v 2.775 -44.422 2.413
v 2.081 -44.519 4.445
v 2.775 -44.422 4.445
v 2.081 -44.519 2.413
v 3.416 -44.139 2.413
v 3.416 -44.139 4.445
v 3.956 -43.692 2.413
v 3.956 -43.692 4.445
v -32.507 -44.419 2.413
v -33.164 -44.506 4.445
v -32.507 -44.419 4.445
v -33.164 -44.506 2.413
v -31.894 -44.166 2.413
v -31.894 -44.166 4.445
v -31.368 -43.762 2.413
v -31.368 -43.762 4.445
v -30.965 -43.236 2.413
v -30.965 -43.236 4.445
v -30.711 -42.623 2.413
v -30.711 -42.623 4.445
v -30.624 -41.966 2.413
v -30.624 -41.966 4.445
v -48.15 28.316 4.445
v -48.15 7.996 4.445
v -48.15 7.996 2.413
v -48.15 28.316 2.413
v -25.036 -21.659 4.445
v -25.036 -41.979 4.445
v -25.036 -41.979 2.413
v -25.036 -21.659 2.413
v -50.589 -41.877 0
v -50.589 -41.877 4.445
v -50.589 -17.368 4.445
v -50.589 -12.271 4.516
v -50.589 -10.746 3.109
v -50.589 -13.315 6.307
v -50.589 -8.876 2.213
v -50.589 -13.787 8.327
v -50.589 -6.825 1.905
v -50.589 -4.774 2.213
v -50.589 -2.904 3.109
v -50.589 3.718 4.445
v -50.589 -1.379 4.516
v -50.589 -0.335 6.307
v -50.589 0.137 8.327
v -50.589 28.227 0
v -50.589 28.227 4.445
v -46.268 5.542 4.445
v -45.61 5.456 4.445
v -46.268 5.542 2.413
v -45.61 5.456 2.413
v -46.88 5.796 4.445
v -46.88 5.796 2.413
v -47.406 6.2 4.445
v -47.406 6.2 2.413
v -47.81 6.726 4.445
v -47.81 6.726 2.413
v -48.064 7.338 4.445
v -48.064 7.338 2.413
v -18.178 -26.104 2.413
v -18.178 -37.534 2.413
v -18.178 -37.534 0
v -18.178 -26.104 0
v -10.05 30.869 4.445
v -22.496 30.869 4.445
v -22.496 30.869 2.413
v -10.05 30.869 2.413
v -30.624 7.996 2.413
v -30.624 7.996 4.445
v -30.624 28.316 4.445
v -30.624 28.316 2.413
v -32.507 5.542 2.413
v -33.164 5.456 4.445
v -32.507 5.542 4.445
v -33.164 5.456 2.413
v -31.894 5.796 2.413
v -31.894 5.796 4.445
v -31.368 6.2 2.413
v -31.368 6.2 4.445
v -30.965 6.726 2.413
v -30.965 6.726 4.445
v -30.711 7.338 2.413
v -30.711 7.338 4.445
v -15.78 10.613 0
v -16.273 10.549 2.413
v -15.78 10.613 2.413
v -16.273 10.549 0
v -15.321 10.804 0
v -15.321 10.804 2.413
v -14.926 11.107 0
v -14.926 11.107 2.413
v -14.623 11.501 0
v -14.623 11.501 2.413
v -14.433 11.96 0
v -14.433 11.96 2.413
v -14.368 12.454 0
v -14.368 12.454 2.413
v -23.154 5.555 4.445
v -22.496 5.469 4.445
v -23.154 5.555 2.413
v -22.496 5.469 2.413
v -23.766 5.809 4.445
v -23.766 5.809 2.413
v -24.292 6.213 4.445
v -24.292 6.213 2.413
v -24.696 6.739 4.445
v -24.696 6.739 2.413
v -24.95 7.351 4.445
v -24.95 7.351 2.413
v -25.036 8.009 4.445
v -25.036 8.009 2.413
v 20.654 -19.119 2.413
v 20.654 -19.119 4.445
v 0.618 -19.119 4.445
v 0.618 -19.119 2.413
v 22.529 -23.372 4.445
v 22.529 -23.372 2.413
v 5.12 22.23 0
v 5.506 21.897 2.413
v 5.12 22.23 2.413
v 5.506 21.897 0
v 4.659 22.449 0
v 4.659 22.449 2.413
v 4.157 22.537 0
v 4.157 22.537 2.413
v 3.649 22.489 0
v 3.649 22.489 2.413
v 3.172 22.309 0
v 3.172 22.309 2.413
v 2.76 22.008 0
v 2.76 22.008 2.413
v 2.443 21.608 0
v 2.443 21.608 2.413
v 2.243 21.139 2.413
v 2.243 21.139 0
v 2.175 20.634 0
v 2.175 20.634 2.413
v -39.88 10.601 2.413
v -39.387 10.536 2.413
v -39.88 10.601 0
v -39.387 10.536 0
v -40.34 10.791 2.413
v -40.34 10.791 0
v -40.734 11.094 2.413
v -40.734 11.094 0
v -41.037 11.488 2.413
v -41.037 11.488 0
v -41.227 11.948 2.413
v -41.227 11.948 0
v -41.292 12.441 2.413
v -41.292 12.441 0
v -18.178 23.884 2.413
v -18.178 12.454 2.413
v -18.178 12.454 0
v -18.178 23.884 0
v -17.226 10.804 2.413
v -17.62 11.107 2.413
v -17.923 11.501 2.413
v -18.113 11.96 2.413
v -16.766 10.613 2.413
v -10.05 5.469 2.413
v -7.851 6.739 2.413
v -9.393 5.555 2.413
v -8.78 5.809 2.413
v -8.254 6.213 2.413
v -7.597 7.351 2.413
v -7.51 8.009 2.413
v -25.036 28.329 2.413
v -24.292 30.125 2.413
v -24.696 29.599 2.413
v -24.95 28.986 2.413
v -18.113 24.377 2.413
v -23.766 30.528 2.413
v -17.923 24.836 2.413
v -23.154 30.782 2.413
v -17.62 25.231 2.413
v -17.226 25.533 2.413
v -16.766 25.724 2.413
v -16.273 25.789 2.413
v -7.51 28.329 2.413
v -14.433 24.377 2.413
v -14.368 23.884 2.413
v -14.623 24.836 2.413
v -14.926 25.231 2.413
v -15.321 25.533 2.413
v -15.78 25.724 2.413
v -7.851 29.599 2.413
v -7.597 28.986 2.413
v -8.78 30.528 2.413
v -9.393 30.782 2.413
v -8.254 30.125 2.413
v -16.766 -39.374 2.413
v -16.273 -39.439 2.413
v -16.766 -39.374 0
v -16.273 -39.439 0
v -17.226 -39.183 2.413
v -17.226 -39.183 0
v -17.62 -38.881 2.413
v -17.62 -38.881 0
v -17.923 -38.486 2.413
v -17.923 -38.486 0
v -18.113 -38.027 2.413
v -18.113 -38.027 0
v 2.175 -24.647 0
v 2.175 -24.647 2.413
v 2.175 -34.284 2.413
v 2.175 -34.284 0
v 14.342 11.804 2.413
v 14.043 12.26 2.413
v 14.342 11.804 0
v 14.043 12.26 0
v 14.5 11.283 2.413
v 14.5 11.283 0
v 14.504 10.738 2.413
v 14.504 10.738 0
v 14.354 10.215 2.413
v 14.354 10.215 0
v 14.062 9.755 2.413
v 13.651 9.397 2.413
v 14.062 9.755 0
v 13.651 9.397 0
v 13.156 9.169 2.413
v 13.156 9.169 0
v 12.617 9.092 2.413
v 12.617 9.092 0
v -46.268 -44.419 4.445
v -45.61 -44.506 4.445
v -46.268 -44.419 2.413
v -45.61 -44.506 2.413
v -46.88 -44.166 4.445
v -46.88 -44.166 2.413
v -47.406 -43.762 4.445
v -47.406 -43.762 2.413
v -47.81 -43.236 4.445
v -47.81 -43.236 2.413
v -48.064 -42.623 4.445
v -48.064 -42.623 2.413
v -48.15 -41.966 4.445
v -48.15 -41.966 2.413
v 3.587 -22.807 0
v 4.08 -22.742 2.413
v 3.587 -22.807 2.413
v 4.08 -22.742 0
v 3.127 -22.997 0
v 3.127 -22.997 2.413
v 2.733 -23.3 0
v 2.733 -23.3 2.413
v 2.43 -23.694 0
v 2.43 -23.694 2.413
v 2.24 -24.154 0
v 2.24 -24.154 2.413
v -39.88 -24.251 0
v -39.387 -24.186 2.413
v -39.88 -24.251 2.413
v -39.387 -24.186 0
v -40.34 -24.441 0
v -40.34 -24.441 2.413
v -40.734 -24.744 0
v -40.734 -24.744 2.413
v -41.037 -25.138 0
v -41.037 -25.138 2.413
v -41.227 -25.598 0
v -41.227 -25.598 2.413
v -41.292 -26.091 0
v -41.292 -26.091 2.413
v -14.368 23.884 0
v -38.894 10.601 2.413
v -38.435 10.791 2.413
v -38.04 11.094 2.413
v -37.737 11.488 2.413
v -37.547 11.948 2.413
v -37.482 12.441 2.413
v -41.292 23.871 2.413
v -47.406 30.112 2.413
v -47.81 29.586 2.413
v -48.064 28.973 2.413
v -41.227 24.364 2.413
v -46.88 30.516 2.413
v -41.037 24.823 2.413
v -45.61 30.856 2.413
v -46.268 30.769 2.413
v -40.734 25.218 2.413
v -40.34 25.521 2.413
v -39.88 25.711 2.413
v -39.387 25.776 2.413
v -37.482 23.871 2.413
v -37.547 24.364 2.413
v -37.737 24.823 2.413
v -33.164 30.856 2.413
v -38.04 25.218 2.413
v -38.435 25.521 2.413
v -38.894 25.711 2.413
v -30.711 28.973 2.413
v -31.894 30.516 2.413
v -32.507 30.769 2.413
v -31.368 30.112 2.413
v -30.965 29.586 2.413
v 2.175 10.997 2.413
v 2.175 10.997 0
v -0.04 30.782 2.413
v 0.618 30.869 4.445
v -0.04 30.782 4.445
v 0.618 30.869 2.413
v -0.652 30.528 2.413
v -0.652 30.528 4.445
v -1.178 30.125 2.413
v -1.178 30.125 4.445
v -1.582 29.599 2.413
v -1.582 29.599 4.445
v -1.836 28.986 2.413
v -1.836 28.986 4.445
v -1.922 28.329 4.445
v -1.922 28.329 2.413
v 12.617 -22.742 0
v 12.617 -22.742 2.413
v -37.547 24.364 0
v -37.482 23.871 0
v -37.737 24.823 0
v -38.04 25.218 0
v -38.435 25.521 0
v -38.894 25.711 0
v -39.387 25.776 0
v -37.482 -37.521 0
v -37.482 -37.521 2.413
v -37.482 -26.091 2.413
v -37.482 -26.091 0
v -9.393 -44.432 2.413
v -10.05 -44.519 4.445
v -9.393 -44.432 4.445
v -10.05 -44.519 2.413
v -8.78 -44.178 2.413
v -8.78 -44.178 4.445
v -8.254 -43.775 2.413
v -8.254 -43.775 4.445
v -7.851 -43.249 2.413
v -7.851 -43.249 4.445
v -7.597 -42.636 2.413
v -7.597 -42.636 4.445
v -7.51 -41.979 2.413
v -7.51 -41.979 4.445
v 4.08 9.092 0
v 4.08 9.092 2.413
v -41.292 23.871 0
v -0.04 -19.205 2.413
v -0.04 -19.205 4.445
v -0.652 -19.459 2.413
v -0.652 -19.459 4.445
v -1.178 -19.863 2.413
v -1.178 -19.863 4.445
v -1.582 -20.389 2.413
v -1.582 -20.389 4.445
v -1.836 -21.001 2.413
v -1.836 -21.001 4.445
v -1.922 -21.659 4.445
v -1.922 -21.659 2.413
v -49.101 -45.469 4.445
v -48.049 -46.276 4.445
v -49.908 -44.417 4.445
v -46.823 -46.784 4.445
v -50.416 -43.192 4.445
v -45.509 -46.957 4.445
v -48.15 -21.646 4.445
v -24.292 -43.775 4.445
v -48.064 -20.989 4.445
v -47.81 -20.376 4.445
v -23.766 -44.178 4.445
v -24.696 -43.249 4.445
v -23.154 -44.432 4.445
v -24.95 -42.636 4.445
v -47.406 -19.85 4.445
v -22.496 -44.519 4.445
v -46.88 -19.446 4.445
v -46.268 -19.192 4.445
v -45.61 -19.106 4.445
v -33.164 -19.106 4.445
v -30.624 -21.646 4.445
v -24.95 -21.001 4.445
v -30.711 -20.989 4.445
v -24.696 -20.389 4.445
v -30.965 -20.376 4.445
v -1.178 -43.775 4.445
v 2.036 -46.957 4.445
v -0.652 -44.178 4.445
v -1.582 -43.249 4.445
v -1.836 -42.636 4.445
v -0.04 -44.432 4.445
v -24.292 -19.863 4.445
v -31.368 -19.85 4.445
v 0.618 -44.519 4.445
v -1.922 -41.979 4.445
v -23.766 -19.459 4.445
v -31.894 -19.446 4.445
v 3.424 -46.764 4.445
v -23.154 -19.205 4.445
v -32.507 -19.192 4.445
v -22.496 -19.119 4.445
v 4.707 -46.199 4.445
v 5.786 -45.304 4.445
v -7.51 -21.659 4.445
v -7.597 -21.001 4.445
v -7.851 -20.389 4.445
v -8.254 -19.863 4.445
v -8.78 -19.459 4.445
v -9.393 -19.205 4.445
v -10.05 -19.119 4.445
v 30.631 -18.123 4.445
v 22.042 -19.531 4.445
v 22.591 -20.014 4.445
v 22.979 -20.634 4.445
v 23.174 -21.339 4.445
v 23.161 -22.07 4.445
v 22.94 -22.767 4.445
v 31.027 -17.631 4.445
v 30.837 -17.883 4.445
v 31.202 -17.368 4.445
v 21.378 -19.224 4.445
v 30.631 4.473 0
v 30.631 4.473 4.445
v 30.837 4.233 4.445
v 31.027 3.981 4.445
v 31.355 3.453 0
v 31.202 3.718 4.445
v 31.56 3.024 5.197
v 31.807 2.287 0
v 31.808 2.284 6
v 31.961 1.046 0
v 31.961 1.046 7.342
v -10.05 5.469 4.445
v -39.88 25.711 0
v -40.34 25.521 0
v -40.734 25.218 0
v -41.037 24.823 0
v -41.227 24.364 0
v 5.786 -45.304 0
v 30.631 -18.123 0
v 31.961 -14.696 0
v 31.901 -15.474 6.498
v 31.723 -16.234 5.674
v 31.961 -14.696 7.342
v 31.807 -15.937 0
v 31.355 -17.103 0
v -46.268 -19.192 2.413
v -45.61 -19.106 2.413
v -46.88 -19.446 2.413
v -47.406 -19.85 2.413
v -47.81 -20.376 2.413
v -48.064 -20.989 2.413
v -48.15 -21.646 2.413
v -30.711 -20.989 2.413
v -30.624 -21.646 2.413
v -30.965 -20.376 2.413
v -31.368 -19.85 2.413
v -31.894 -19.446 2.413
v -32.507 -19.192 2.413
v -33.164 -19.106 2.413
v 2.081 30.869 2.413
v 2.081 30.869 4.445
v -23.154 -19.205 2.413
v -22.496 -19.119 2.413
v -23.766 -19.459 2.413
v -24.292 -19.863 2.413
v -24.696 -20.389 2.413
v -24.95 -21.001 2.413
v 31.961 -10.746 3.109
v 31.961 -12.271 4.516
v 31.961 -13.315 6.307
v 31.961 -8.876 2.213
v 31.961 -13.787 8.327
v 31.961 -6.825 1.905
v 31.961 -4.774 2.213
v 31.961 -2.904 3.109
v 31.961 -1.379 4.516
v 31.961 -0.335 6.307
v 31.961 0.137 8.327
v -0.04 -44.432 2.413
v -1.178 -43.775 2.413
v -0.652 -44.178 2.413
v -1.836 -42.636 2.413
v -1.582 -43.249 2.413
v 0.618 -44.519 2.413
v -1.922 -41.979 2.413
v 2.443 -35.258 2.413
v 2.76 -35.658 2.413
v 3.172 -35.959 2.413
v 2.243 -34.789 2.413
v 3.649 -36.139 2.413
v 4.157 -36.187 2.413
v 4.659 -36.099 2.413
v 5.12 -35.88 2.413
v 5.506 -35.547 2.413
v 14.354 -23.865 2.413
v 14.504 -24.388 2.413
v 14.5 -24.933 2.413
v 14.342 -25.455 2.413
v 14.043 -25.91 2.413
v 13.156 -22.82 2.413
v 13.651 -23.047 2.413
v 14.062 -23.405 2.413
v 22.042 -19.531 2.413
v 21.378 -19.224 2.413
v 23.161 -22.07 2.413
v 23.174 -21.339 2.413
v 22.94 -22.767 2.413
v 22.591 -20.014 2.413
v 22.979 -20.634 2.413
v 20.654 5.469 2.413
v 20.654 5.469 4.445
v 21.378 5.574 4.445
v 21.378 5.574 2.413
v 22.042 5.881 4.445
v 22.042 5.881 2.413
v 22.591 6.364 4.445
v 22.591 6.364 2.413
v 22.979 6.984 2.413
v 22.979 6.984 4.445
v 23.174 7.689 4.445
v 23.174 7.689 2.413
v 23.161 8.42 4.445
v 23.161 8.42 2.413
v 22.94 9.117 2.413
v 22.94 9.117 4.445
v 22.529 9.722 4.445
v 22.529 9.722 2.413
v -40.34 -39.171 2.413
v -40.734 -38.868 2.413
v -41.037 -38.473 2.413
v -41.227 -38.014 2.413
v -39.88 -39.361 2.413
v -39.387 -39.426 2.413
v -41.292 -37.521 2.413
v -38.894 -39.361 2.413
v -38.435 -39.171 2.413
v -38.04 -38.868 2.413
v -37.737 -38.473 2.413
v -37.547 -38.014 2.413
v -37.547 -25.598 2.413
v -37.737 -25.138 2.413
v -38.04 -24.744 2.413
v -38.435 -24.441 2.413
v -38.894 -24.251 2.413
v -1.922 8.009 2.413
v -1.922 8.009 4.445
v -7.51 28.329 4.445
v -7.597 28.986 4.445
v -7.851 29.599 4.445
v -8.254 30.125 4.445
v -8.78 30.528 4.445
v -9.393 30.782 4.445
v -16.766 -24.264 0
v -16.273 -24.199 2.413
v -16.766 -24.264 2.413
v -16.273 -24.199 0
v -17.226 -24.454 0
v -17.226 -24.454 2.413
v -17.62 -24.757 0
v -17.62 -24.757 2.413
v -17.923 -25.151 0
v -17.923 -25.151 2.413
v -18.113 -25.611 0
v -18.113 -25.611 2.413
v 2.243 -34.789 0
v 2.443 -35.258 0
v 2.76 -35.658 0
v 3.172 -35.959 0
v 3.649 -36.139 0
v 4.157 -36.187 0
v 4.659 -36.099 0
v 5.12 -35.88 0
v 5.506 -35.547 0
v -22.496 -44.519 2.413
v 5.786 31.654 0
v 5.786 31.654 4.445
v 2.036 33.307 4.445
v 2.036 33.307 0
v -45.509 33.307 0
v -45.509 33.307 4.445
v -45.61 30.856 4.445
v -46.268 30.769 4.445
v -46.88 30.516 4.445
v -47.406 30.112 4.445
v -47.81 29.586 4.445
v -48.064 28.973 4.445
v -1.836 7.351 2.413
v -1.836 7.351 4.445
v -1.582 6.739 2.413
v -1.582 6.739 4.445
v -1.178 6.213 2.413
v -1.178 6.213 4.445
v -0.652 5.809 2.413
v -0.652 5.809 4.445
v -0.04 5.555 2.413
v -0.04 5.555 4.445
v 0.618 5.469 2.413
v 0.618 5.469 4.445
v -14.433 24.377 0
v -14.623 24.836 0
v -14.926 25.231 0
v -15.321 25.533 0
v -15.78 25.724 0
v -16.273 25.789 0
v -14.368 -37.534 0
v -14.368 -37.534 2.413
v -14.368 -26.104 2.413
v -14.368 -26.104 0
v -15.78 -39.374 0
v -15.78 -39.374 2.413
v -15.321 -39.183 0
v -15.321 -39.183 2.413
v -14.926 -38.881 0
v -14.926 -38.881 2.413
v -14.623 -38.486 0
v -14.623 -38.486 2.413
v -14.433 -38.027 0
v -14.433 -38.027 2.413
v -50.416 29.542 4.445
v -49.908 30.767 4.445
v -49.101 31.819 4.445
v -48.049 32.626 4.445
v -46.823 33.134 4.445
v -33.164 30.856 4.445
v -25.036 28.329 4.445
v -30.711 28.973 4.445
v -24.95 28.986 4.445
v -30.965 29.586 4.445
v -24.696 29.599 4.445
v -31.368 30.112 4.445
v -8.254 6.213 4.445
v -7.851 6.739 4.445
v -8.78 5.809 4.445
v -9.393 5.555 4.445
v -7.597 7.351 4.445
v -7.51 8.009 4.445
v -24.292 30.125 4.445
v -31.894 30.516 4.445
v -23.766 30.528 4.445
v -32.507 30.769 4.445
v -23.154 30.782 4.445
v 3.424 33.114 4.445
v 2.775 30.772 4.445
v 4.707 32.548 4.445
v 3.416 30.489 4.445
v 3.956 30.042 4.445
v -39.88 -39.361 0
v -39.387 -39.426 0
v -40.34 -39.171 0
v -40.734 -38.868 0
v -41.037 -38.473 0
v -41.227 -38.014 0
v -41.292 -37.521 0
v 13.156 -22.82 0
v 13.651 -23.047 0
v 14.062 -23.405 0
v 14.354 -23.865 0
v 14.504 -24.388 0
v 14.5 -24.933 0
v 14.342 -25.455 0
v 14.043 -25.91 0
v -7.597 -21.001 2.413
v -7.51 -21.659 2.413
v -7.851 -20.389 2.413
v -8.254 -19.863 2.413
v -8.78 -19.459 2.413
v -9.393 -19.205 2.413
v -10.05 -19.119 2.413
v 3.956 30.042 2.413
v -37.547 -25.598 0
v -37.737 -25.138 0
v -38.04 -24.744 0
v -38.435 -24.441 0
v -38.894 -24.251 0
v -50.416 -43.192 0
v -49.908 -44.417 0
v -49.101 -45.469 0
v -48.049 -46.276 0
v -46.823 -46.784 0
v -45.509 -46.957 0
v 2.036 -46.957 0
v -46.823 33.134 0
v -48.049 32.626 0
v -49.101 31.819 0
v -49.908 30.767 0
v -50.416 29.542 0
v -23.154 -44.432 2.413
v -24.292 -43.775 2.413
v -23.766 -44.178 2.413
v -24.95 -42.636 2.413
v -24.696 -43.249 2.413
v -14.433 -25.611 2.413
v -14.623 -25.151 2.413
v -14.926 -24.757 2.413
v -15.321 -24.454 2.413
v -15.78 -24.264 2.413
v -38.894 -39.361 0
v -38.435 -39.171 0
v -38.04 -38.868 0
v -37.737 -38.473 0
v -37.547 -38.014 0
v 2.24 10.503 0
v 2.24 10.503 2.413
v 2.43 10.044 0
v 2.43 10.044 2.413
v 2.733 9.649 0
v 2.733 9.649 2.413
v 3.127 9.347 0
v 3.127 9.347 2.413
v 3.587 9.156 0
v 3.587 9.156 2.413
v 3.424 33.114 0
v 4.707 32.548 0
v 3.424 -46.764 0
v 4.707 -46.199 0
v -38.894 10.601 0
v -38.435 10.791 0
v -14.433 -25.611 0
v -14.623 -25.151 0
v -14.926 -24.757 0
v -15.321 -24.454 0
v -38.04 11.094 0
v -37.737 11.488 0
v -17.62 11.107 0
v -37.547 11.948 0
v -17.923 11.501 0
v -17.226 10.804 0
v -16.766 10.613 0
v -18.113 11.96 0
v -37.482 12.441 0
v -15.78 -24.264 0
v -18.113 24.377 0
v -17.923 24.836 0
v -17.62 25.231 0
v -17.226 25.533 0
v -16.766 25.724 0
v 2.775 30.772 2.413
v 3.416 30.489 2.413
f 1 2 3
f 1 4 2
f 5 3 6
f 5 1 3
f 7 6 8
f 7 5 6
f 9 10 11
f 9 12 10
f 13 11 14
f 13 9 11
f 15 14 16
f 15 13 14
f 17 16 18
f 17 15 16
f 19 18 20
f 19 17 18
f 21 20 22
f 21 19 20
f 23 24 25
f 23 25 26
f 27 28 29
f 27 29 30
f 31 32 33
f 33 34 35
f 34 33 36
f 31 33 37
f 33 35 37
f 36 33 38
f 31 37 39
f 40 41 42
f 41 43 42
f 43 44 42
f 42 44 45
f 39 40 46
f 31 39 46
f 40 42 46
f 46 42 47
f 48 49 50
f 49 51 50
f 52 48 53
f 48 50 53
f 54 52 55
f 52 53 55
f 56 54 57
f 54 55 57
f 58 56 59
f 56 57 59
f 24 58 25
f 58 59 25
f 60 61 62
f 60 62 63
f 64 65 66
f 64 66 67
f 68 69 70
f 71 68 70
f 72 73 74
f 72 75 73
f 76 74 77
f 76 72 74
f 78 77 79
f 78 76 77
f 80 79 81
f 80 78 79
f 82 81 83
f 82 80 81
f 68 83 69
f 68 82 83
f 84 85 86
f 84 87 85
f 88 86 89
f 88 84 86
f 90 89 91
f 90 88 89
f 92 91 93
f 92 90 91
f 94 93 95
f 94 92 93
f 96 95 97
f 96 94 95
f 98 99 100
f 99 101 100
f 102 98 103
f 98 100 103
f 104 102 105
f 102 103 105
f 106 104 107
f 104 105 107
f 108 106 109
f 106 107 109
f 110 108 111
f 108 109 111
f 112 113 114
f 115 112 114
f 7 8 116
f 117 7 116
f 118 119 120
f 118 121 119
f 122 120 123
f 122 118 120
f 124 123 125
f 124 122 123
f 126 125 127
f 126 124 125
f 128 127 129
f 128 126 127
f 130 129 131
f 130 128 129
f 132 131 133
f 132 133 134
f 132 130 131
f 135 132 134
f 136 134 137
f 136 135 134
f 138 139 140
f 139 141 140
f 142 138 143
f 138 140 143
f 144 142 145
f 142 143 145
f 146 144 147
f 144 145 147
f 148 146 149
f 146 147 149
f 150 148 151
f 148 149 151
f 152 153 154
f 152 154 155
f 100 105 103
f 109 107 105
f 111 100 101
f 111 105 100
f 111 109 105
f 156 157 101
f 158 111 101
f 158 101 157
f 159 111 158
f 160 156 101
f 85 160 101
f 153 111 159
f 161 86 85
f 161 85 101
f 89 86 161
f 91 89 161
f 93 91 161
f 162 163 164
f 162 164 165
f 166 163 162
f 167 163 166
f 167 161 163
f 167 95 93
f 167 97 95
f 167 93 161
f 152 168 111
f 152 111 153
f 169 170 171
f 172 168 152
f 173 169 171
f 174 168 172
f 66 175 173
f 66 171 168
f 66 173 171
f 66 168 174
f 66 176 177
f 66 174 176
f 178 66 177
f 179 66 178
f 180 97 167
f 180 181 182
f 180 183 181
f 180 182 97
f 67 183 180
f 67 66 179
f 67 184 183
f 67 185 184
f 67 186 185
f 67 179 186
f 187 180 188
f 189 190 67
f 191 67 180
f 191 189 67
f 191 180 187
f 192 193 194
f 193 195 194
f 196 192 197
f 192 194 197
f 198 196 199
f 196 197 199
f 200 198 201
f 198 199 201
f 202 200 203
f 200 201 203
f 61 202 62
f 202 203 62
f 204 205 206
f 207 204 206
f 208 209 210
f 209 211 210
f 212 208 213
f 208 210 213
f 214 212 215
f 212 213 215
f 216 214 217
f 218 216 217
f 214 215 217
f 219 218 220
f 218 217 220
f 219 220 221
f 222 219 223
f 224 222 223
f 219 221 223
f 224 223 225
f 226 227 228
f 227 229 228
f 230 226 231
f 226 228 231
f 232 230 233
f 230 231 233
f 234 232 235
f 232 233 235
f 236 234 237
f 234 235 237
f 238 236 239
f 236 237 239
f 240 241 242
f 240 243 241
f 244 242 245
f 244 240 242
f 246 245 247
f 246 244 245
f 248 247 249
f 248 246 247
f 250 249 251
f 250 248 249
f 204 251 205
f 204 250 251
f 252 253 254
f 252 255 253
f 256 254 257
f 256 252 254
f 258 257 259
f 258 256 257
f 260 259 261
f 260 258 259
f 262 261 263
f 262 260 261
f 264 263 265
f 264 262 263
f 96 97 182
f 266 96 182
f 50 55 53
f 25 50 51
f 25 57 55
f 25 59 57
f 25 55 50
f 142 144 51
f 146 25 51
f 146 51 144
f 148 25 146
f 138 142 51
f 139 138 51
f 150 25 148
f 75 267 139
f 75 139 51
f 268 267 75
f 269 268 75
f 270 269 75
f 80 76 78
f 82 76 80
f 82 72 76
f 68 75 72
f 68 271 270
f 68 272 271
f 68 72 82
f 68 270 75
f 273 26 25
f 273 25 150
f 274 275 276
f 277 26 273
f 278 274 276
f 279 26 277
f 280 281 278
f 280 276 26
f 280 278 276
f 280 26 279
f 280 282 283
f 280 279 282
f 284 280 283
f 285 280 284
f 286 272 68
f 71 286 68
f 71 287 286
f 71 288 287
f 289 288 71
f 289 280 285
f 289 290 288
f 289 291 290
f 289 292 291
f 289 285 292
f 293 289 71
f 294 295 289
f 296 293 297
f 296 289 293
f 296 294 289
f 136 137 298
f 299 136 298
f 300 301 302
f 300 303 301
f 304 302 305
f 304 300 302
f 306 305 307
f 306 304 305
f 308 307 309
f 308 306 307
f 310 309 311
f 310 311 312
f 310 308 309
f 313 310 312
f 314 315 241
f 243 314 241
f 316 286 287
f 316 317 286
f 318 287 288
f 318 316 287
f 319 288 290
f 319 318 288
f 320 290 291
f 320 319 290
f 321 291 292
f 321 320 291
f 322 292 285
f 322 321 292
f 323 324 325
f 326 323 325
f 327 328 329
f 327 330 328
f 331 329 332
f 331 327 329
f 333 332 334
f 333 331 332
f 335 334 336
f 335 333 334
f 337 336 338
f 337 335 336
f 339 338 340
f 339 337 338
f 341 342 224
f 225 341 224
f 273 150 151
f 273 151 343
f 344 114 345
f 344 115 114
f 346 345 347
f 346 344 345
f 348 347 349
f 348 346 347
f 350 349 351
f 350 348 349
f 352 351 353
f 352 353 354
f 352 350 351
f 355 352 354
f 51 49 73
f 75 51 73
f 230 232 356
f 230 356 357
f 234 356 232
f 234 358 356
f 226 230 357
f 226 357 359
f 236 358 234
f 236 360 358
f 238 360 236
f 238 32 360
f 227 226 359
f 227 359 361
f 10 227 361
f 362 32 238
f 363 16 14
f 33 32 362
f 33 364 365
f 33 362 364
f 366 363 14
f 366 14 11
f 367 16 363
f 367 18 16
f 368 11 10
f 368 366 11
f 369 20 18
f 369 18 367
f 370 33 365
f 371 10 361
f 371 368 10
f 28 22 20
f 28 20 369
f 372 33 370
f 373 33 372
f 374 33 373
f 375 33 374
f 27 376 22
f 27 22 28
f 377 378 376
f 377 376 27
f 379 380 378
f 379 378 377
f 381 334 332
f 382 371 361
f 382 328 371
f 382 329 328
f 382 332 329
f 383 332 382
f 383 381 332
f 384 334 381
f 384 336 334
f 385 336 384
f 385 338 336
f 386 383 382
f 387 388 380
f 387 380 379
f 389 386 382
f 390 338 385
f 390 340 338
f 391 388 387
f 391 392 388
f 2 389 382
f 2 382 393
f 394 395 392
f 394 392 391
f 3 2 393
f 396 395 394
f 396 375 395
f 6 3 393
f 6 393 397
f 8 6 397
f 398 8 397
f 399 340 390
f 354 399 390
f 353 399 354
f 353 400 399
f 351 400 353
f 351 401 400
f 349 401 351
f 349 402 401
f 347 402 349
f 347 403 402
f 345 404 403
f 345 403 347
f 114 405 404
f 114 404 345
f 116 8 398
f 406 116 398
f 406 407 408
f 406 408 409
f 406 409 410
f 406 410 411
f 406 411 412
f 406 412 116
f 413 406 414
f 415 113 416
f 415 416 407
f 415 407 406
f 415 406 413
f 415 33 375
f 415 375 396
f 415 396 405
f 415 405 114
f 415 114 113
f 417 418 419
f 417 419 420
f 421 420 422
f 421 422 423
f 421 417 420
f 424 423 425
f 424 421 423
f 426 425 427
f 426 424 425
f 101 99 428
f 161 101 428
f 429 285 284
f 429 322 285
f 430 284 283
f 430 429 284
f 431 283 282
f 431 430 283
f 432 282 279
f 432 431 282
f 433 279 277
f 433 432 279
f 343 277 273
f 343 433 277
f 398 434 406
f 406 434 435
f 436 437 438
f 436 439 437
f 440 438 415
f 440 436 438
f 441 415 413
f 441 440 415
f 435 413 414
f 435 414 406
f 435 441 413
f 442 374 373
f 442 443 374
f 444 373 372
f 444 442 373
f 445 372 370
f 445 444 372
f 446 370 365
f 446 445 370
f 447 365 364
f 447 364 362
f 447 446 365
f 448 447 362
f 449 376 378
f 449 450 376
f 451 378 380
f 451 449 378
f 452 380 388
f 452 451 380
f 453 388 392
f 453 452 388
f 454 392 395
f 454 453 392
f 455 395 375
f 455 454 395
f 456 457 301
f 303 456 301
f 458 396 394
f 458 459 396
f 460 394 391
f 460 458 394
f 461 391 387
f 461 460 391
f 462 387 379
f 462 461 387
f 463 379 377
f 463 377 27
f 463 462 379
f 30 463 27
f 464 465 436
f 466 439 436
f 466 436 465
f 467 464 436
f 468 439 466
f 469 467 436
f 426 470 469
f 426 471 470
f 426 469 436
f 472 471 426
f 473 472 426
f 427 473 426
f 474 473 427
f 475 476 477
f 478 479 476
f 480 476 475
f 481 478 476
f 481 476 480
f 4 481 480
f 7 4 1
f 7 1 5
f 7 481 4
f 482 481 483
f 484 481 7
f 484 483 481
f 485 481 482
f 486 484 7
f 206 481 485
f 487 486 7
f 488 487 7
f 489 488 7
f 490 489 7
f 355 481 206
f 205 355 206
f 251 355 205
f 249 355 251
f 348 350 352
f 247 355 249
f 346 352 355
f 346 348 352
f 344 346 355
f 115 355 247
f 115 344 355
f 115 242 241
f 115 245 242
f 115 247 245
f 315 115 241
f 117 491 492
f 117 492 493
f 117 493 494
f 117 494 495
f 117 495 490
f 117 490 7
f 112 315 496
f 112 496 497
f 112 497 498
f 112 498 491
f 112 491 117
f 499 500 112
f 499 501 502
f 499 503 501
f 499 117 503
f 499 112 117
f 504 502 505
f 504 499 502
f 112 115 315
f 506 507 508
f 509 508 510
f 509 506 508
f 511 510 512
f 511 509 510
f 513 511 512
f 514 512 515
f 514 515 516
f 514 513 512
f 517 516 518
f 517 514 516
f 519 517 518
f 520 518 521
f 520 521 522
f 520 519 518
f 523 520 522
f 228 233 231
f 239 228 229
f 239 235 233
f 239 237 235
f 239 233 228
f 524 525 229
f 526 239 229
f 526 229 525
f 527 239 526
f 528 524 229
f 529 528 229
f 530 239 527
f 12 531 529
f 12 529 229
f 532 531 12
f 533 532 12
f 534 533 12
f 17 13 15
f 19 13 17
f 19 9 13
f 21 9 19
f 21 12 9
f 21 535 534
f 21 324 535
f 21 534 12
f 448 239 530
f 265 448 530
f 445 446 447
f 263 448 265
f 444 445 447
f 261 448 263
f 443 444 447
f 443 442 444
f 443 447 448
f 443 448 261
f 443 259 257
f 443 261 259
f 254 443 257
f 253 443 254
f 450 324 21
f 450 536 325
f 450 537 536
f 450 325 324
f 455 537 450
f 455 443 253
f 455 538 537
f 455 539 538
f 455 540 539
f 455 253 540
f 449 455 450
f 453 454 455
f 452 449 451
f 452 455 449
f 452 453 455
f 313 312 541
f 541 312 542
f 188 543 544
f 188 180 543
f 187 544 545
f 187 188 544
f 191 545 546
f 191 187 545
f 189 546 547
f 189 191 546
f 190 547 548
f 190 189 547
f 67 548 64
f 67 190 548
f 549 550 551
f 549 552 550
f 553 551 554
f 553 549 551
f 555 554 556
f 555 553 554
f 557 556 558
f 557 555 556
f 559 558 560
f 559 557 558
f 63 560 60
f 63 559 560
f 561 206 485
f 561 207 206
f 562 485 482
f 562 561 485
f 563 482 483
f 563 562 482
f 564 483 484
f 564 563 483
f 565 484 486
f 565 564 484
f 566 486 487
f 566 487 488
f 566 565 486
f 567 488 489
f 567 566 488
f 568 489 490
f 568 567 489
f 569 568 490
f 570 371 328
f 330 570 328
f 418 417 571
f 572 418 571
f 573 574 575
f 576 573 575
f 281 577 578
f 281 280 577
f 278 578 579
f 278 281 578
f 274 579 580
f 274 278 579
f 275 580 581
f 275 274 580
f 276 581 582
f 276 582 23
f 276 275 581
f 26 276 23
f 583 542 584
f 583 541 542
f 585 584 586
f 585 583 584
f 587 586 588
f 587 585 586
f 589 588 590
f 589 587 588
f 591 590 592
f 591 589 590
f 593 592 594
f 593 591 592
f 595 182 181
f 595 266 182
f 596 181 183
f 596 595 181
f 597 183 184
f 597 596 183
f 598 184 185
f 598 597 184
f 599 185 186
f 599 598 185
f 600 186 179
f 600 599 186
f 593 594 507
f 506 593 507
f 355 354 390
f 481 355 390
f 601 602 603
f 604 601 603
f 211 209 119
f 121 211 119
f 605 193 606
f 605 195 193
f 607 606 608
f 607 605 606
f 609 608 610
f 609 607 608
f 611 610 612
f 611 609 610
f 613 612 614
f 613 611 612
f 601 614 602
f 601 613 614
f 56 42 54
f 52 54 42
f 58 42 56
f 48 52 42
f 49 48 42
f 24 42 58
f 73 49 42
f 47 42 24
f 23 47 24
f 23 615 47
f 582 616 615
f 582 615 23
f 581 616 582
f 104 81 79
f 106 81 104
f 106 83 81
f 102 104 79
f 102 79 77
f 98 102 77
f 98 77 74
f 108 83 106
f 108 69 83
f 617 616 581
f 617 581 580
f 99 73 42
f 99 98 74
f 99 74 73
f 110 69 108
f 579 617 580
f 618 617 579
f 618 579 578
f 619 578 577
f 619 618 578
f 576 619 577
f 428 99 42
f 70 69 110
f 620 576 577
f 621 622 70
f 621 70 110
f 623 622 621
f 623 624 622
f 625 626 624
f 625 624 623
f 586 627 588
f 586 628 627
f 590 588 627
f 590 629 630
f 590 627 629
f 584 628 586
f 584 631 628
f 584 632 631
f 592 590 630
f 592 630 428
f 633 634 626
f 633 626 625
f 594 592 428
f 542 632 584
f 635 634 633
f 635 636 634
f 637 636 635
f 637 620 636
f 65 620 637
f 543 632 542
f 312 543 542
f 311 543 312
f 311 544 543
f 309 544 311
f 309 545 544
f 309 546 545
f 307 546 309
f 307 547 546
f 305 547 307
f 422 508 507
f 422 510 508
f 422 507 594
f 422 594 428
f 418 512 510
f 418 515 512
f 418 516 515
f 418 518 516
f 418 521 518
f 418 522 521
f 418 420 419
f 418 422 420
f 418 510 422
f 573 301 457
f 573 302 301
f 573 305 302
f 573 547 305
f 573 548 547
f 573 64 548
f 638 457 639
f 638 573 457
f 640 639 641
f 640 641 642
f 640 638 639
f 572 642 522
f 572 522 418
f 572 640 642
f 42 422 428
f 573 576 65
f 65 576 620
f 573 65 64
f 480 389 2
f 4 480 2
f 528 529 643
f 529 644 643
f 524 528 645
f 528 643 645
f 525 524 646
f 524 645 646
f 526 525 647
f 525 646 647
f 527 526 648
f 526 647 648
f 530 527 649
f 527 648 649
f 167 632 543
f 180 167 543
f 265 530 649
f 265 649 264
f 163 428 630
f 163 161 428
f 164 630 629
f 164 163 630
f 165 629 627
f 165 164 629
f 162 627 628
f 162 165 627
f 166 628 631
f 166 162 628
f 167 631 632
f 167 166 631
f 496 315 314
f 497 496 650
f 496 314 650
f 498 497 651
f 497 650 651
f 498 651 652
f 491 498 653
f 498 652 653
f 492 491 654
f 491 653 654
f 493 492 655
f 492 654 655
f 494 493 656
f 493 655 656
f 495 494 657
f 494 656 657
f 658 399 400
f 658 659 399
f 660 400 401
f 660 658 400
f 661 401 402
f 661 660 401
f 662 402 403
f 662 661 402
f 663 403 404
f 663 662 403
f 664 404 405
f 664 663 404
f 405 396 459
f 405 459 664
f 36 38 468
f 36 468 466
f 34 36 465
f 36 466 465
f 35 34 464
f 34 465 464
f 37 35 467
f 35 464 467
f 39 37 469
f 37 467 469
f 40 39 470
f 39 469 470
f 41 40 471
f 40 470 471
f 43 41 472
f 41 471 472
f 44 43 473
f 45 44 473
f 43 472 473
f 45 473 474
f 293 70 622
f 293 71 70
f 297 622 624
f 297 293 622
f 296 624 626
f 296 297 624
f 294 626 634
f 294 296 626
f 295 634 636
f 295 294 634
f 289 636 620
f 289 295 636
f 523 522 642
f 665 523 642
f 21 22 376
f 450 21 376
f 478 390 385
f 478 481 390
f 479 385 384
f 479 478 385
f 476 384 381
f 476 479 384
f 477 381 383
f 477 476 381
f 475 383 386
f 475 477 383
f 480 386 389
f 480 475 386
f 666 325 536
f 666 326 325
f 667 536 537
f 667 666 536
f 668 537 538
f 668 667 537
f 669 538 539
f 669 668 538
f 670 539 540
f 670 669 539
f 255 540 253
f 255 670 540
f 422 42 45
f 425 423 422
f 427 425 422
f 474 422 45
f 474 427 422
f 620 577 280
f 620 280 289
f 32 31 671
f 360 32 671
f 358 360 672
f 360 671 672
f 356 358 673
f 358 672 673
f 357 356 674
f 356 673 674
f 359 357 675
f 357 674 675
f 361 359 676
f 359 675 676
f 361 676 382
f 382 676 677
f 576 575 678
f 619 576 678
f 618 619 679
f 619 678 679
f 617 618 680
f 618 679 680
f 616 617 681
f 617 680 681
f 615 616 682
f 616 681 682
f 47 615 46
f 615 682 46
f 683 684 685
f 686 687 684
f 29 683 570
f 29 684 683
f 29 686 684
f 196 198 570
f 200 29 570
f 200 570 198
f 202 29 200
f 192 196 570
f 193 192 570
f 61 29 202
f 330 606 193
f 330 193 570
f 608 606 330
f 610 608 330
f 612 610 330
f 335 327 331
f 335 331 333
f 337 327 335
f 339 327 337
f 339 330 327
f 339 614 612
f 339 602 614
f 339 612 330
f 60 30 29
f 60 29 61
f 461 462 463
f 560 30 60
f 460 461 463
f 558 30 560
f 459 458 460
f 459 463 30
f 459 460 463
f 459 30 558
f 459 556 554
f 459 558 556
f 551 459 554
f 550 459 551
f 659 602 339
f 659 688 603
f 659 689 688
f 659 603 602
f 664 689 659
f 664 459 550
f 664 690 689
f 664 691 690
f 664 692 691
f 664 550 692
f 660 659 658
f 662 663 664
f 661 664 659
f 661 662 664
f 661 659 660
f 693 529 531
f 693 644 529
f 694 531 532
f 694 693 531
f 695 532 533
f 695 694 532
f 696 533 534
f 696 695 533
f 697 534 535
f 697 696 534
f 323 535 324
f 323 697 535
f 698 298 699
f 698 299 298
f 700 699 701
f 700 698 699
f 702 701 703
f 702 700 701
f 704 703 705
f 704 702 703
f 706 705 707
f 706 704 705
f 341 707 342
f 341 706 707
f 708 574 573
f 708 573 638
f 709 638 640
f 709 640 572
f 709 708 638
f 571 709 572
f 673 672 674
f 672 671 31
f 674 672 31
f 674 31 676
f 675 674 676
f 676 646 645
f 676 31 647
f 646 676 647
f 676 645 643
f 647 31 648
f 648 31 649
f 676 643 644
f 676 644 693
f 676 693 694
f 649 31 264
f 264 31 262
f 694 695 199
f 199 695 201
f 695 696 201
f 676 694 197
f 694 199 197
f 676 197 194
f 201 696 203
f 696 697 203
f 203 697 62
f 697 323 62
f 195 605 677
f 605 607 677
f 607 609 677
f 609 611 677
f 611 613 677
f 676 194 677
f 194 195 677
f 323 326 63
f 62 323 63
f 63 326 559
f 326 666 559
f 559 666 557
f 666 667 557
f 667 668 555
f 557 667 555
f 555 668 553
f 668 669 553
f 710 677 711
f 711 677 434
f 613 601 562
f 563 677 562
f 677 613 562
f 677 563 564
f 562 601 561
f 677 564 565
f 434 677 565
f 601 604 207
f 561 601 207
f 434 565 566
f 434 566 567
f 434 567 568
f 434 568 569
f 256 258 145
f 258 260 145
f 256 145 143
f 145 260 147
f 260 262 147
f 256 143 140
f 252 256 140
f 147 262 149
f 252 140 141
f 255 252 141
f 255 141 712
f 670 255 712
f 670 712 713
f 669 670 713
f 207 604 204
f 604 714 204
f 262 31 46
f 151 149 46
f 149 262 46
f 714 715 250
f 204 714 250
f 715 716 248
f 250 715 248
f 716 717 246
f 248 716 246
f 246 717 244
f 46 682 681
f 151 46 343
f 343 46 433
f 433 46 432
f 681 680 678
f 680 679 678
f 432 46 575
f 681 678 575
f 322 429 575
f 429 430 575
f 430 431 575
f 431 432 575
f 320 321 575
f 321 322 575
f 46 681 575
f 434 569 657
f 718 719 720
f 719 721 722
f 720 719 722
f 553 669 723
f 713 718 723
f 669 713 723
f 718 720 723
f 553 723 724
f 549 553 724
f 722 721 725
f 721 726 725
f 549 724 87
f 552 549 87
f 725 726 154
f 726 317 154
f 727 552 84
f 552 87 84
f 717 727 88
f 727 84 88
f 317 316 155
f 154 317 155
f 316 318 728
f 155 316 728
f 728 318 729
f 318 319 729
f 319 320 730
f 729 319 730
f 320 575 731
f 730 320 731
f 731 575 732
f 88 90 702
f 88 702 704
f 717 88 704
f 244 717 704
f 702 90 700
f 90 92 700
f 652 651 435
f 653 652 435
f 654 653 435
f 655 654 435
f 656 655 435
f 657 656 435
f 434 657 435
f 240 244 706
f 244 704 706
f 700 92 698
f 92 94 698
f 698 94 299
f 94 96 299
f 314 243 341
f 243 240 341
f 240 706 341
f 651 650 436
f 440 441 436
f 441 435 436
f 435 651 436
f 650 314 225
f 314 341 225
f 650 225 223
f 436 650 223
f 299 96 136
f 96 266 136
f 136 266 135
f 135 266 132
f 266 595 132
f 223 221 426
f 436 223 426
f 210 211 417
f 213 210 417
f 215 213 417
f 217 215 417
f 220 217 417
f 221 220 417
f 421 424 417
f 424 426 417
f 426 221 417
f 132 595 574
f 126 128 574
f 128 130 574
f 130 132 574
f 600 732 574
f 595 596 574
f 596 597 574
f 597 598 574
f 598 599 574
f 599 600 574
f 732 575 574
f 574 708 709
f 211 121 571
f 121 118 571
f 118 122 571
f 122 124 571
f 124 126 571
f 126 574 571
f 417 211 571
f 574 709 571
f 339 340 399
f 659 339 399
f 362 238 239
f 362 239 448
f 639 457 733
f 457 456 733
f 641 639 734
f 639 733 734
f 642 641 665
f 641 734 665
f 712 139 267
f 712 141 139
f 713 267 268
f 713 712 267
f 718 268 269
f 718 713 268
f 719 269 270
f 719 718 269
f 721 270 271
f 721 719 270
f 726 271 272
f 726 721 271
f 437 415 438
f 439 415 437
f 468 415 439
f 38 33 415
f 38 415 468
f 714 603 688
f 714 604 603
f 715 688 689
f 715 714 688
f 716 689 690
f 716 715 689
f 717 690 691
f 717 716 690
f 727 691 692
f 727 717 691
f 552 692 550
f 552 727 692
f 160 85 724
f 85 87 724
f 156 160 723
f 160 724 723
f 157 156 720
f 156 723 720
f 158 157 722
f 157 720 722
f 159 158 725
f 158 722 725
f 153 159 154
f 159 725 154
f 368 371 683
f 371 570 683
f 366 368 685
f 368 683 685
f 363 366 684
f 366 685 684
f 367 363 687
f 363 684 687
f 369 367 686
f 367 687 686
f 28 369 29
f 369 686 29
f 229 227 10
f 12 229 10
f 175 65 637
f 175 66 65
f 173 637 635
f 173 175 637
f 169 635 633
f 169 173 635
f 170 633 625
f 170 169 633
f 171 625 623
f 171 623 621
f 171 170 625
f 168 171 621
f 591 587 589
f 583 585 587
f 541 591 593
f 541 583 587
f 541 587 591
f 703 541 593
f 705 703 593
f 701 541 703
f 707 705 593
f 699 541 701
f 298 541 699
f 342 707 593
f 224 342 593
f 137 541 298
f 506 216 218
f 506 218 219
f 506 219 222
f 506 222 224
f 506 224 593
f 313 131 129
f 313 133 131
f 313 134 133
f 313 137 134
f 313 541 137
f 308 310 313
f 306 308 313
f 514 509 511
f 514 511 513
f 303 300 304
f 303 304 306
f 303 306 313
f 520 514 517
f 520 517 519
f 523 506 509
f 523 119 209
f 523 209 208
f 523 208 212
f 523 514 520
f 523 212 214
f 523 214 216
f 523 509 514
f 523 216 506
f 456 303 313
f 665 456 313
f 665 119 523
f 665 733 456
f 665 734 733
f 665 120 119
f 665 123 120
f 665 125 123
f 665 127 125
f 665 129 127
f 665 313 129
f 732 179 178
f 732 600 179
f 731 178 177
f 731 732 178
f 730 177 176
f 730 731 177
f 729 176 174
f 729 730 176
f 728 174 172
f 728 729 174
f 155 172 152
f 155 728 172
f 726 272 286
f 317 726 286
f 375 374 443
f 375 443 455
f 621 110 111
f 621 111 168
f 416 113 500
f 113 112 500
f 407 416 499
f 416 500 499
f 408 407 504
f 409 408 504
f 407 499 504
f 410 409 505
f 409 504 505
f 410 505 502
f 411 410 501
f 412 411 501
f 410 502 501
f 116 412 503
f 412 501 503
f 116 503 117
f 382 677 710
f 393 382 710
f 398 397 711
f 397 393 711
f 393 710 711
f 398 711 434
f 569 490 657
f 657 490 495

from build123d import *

# Parameters (mm, degrees)
F0_W         = 27.686
F0_H         = 19.685
F1_DEPTH     = 4.445
F4_DEPTH     = 82.55
F5_T4_DEPTH  = 82.55
F5_T9_DEPTH  = 82.55
F3_R         = 6.985
F6_DEPTH     = 101.6
F7_W         = 17.526
F7_H         = 25.4
F8_DEPTH     = 2.032
F9_R         = 2.54
F10_W        = 3.81
F10_H        = 15.24
F11_DEPTH    = 25.4
F12_R        = 1.90499
F13_T1_DEPTH = 29.845
F13_T3_DEPTH = 15.6401229428
F13_T5_DEPTH = 15.0634324568


# Not quite as in the source:
# - a fillet or chamfer that OpenCascade refuses, or shapes differently, is made with other operations: its cross-section is extruded or revolved along the edge and cut away or added
# - a fillet or chamfer is up to 0.001 mm smaller than in the source, because OpenCascade refuses the exact size


with BuildPart() as f1:
    # F0 (on Top) → F1 (new body)
    with BuildSketch(Plane.XY):
        Polygon((4.2753211141, 33.3069552488), (-50.5886788859, 33.3069552488), (-50.5886788859, -46.9570447512), (4.2753211141, -46.9570447512), (4.2753211141, -16.6675447512), (4.2753211141, 3.0174552488), align=None)
        Polygon((31.9613211141, 3.0174552488), (4.2753211141, 33.3069552488), (4.2753211141, 3.0174552488), align=None)
        with Locations((18.1183211141, -6.8250447512)):
            Rectangle(F0_W, F0_H)
        Polygon((4.2753211141, -16.6675447512), (4.2753211141, -46.9570447512), (31.9613211141, -16.6675447512), align=None)
    extrude(amount=F1_DEPTH)

    # F3 (on face) → F4 (join)
    with BuildSketch(Plane.YZ.offset(31.9613211141)):
        with BuildLine():
            Line((-1.4368910785, 4.445), (-12.2131984238, 4.445))
            ThreePointArc((-12.2131984238, 4.445), (-6.8250447512, 1.905), (-1.4368910785, 4.445))
        make_face()
        with BuildLine():
            ThreePointArc((-1.4368910785, 4.445), (-0.2513669981, 6.5284357306), (0.1599552488, 8.89))
            ThreePointArc((0.1599552488, 8.89), (-9.1866090205, 15.4636777531), (-12.2131984238, 4.445))
            Line((-12.2131984238, 4.445), (-1.4368910785, 4.445))
        make_face()
    extrude(amount=-F4_DEPTH)

    # F5: chamfer of 7.62 on 2 edges, made by hand


with BuildPart() as f5_tool2:
    # F5_s3 → F5_t4 (new body)
    with BuildSketch(Plane.YZ.offset(31.9613211141)):
        with BuildLine():
            Line((3.9242683255, 4.2209526948), (-0.0694446449, 8.550803314))
            Line((-0.0694446449, 8.550803314), (-0.2213483693, 8.5630922738))
            ThreePointArc((-0.2213483693, 8.5630922738), (-0.4679887951, 6.3855514916), (-1.554450795, 4.5419818182))
            Line((-1.554450795, 4.5419818182), (-1.4368910785, 4.2926))
            ThreePointArc((-1.4368910785, 4.2926), (1.2436886235, 4.2926), (3.9242683255, 4.0685526948))
            Line((3.9242683255, 4.0685526948), (3.9242683255, 4.2209526948))
        make_face()
    extrude(amount=-F5_T4_DEPTH)

    split(bisect_by=Plane(origin=(18.9157105891, 17.2898319012, 0), x_dir=(0, 0, 1), z_dir=(-0.7381168756, -0.6746728674, 0)), keep=Keep.TOP)


with BuildPart() as f1_1:
    add(f1.part)

    # F5_t1: union F5_tool2
    add(f5_tool2.part)


with BuildPart() as f5_tool7:
    # F5_s8 → F5_t9 (new body)
    with BuildSketch(Plane.YZ.offset(-50.5886788859)):
        with BuildLine():
            Line((-17.5743578278, 4.2209526948), (-13.5806448574, 8.550803314))
            Line((-13.5806448574, 8.550803314), (-13.4287411331, 8.5630922738))
            ThreePointArc((-13.4287411331, 8.5630922738), (-13.1821007073, 6.3855514916), (-12.0956387073, 4.5419818182))
            Line((-12.0956387073, 4.5419818182), (-12.2131984238, 4.2926))
            ThreePointArc((-12.2131984238, 4.2926), (-14.8937781258, 4.2926), (-17.5743578278, 4.0685526948))
            Line((-17.5743578278, 4.0685526948), (-17.5743578278, 4.2209526948))
        make_face()
    extrude(amount=F5_T9_DEPTH)

    split(bisect_by=Plane(origin=(25.7132835648, -23.5031271159, 0), x_dir=(0, 0, 1), z_dir=(-0.7381168756, 0.6746728674, 0)), keep=Keep.TOP)


with BuildPart() as f1_2:
    add(f1_1.part)

    # F5_t6: union F5_tool7
    add(f5_tool7.part)

    # F3 (on face) → F6 (cut)
    with BuildSketch(Plane.YZ.offset(31.9613211141)):
        with Locations((-6.8250447512, 8.89)):
            Circle(F3_R)
    extrude(amount=-F6_DEPTH, mode=Mode.SUBTRACT)

    # F7 (on face) → F8 (cut)
    with BuildSketch(Plane.XY.offset(4.445)):
        with Locations((-39.3872788859, -31.8059447512)):
            Rectangle(F7_W, F7_H)
        with Locations((-16.2732788859, -31.8186447512)):
            Rectangle(F7_W, F7_H)
        Polygon((26.4173608001, -19.1186447512), (-1.9222788859, -19.1186447512), (-1.9222788859, -44.5186447512), (3.2005893116, -44.5186447512), align=None)
        Polygon((3.2005893116, 30.8685552488), (-1.9222788859, 30.8685552488), (-1.9222788859, 5.4685552488), (26.4173608001, 5.4685552488), align=None)
        with Locations((-39.3872788859, 18.1558552488)):
            Rectangle(F7_W, F7_H)
        with Locations((-16.2732788859, 18.1685552488)):
            Rectangle(F7_W, F7_H)
    extrude(amount=-F8_DEPTH, mode=Mode.SUBTRACT)

    # F9
    f9_edges = [f1_2.edges().sort_by_distance(p)[0] for p in [
        (-48.150279, -19.105945, 3.429),
        (-48.150279, 30.855855, 3.429),
        (-25.036279, 30.868555, 3.429),
        (-1.922279, 30.868555, 3.429),
        (3.200589, 30.868555, 3.429),
        (-1.922279, -19.118645, 3.429),
        (-25.036279, -19.118645, 3.429),
        (-30.624279, 30.855855, 3.429),
        (-7.510279, 30.868555, 3.429),
        (26.417361, -19.118645, 3.429),
        (-7.510279, -19.118645, 3.429),
        (-30.624279, -19.105945, 3.429),
        (3.200589, -44.518645, 3.429),
        (-7.510279, -44.518645, 3.429),
        (-30.624279, -44.505945, 3.429),
        (-7.510279, 5.468555, 3.429),
        (-30.624279, 5.455855, 3.429),
        (-48.150279, 5.455855, 3.429),
        (-48.150279, -44.505945, 3.429),
        (-25.036279, -44.518645, 3.429),
        (-1.922279, -44.518645, 3.429),
        (-1.922279, 5.468555, 3.429),
        (-25.036279, 5.468555, 3.429),
        (26.417361, 5.468555, 3.429),
    ]]
    fillet(f9_edges, radius=F9_R)

    # F10 (on face) → F11 (cut)
    with BuildSketch(Plane.XY.offset(4.445)):
        with Locations((-39.3872788859, -31.8059447512)):
            Rectangle(F10_W, F10_H)
        with Locations((-16.2732788859, -31.8186447512)):
            Rectangle(F10_W, F10_H)
        Polygon((16.8492179688, -22.7416258461), (2.1748828364, -22.7416258461), (2.1748828364, -39.307281707), align=None)
        Polygon((16.8492179688, 9.0915363437), (2.1748828364, 25.6571922047), (2.1748828364, 9.0915363437), align=None)
        with Locations((-16.2732788859, 18.1685552488)):
            Rectangle(F10_W, F10_H)
        with Locations((-39.3872788859, 18.1558552488)):
            Rectangle(F10_W, F10_H)
    extrude(amount=-F11_DEPTH, mode=Mode.SUBTRACT)

    # F12 (radius 1.905 in the source; OpenCascade refuses exactly that, so slightly less here)
    f12_edges = [f1_2.edges().sort_by_distance(p)[0] for p in [
        (-41.292279, -24.185945, 1.2065),
        (-37.482279, -24.185945, 1.2065),
        (-14.368279, -24.198645, 1.2065),
        (16.849218, -22.741626, 1.2065),
        (-14.368279, 25.788555, 1.2065),
        (-37.482279, 25.775855, 1.2065),
        (-18.178279, -24.198645, 1.2065),
        (2.174883, -22.741626, 1.2065),
        (-18.178279, 25.788555, 1.2065),
        (-41.292279, 25.775855, 1.2065),
        (2.174883, 25.657192, 1.2065),
        (-41.292279, -39.425945, 1.2065),
        (-18.178279, -39.438645, 1.2065),
        (-41.292279, 10.535855, 1.2065),
        (-18.178279, 10.548555, 1.2065),
        (2.174883, 9.091536, 1.2065),
        (-14.368279, -39.438645, 1.2065),
        (-37.482279, -39.425945, 1.2065),
        (-14.368279, 10.548555, 1.2065),
        (-37.482279, 10.535855, 1.2065),
        (16.849218, 9.091536, 1.2065),
        (2.174883, -39.307282, 1.2065),
    ]]
    fillet(f12_edges, radius=F12_R)

    # F13: fillet of radius 5.08 on 6 edges, made by hand

    # F13_s2 → F13_t1 (cut)
    with BuildSketch(Plane.XY.offset(-12.7)):
        with BuildLine():
            ThreePointArc((-50.5886788859, -41.8770447512), (-49.1007813343, -45.4691471996), (-45.5086788859, -46.9570447512))
            Line((-45.5086788859, -46.9570447512), (-50.5886788859, -46.9570447512))
            Line((-50.5886788859, -46.9570447512), (-50.5886788859, -41.8770447512))
        make_face()
        with BuildLine():
            ThreePointArc((-45.5086788859, 33.3069552488), (-49.1007813343, 31.8190576973), (-50.5886788859, 28.2269552488))
            Line((-50.5886788859, 28.2269552488), (-50.5886788859, 33.3069552488))
            Line((-50.5886788859, 33.3069552488), (-45.5086788859, 33.3069552488))
        make_face()
    extrude(amount=F13_T1_DEPTH, mode=Mode.SUBTRACT)

    # F13_s4 → F13_t3 (cut)
    with BuildSketch(Plane.XY.offset(-5.5975614714)):
        with BuildLine():
            ThreePointArc((2.0362965256, -46.9570447512), (4.0851403599, -46.5255540759), (5.7859302534, -45.3043829175))
            Line((5.7859302534, -45.3043829175), (4.2753211141, -46.9570447512))
            Line((4.2753211141, -46.9570447512), (2.0362965256, -46.9570447512))
        make_face()
        with BuildLine():
            ThreePointArc((2.0362965256, 33.3069552488), (4.0851403599, 32.8754645736), (5.7859302534, 31.6542934152))
            Line((5.7859302534, 31.6542934152), (4.2753211141, 33.3069552488))
            Line((4.2753211141, 33.3069552488), (2.0362965256, 33.3069552488))
        make_face()
    extrude(amount=F13_T3_DEPTH, mode=Mode.SUBTRACT)

    # F13_s6 → F13_t5 (cut)
    with BuildSketch(Plane.XY.offset(-4.9296716098)):
        with BuildLine():
            ThreePointArc((31.9613211141, -14.6956761073), (31.6170649489, -16.5339172044), (30.630954842, -18.1230142736))
            Line((30.630954842, -18.1230142736), (31.9613211141, -16.6675447512))
            Line((31.9613211141, -16.6675447512), (31.9613211141, -14.6956761073))
        make_face()
        with BuildLine():
            ThreePointArc((30.630954842, 4.4729247713), (31.6170649489, 2.8838277021), (31.9613211141, 1.0455866049))
            Line((31.9613211141, 1.0455866049), (31.9613211141, 3.0174552488))
            Line((31.9613211141, 3.0174552488), (30.630954842, 4.4729247713))
        make_face()
    extrude(amount=F13_T5_DEPTH, mode=Mode.SUBTRACT)


solid = f1_2.part
